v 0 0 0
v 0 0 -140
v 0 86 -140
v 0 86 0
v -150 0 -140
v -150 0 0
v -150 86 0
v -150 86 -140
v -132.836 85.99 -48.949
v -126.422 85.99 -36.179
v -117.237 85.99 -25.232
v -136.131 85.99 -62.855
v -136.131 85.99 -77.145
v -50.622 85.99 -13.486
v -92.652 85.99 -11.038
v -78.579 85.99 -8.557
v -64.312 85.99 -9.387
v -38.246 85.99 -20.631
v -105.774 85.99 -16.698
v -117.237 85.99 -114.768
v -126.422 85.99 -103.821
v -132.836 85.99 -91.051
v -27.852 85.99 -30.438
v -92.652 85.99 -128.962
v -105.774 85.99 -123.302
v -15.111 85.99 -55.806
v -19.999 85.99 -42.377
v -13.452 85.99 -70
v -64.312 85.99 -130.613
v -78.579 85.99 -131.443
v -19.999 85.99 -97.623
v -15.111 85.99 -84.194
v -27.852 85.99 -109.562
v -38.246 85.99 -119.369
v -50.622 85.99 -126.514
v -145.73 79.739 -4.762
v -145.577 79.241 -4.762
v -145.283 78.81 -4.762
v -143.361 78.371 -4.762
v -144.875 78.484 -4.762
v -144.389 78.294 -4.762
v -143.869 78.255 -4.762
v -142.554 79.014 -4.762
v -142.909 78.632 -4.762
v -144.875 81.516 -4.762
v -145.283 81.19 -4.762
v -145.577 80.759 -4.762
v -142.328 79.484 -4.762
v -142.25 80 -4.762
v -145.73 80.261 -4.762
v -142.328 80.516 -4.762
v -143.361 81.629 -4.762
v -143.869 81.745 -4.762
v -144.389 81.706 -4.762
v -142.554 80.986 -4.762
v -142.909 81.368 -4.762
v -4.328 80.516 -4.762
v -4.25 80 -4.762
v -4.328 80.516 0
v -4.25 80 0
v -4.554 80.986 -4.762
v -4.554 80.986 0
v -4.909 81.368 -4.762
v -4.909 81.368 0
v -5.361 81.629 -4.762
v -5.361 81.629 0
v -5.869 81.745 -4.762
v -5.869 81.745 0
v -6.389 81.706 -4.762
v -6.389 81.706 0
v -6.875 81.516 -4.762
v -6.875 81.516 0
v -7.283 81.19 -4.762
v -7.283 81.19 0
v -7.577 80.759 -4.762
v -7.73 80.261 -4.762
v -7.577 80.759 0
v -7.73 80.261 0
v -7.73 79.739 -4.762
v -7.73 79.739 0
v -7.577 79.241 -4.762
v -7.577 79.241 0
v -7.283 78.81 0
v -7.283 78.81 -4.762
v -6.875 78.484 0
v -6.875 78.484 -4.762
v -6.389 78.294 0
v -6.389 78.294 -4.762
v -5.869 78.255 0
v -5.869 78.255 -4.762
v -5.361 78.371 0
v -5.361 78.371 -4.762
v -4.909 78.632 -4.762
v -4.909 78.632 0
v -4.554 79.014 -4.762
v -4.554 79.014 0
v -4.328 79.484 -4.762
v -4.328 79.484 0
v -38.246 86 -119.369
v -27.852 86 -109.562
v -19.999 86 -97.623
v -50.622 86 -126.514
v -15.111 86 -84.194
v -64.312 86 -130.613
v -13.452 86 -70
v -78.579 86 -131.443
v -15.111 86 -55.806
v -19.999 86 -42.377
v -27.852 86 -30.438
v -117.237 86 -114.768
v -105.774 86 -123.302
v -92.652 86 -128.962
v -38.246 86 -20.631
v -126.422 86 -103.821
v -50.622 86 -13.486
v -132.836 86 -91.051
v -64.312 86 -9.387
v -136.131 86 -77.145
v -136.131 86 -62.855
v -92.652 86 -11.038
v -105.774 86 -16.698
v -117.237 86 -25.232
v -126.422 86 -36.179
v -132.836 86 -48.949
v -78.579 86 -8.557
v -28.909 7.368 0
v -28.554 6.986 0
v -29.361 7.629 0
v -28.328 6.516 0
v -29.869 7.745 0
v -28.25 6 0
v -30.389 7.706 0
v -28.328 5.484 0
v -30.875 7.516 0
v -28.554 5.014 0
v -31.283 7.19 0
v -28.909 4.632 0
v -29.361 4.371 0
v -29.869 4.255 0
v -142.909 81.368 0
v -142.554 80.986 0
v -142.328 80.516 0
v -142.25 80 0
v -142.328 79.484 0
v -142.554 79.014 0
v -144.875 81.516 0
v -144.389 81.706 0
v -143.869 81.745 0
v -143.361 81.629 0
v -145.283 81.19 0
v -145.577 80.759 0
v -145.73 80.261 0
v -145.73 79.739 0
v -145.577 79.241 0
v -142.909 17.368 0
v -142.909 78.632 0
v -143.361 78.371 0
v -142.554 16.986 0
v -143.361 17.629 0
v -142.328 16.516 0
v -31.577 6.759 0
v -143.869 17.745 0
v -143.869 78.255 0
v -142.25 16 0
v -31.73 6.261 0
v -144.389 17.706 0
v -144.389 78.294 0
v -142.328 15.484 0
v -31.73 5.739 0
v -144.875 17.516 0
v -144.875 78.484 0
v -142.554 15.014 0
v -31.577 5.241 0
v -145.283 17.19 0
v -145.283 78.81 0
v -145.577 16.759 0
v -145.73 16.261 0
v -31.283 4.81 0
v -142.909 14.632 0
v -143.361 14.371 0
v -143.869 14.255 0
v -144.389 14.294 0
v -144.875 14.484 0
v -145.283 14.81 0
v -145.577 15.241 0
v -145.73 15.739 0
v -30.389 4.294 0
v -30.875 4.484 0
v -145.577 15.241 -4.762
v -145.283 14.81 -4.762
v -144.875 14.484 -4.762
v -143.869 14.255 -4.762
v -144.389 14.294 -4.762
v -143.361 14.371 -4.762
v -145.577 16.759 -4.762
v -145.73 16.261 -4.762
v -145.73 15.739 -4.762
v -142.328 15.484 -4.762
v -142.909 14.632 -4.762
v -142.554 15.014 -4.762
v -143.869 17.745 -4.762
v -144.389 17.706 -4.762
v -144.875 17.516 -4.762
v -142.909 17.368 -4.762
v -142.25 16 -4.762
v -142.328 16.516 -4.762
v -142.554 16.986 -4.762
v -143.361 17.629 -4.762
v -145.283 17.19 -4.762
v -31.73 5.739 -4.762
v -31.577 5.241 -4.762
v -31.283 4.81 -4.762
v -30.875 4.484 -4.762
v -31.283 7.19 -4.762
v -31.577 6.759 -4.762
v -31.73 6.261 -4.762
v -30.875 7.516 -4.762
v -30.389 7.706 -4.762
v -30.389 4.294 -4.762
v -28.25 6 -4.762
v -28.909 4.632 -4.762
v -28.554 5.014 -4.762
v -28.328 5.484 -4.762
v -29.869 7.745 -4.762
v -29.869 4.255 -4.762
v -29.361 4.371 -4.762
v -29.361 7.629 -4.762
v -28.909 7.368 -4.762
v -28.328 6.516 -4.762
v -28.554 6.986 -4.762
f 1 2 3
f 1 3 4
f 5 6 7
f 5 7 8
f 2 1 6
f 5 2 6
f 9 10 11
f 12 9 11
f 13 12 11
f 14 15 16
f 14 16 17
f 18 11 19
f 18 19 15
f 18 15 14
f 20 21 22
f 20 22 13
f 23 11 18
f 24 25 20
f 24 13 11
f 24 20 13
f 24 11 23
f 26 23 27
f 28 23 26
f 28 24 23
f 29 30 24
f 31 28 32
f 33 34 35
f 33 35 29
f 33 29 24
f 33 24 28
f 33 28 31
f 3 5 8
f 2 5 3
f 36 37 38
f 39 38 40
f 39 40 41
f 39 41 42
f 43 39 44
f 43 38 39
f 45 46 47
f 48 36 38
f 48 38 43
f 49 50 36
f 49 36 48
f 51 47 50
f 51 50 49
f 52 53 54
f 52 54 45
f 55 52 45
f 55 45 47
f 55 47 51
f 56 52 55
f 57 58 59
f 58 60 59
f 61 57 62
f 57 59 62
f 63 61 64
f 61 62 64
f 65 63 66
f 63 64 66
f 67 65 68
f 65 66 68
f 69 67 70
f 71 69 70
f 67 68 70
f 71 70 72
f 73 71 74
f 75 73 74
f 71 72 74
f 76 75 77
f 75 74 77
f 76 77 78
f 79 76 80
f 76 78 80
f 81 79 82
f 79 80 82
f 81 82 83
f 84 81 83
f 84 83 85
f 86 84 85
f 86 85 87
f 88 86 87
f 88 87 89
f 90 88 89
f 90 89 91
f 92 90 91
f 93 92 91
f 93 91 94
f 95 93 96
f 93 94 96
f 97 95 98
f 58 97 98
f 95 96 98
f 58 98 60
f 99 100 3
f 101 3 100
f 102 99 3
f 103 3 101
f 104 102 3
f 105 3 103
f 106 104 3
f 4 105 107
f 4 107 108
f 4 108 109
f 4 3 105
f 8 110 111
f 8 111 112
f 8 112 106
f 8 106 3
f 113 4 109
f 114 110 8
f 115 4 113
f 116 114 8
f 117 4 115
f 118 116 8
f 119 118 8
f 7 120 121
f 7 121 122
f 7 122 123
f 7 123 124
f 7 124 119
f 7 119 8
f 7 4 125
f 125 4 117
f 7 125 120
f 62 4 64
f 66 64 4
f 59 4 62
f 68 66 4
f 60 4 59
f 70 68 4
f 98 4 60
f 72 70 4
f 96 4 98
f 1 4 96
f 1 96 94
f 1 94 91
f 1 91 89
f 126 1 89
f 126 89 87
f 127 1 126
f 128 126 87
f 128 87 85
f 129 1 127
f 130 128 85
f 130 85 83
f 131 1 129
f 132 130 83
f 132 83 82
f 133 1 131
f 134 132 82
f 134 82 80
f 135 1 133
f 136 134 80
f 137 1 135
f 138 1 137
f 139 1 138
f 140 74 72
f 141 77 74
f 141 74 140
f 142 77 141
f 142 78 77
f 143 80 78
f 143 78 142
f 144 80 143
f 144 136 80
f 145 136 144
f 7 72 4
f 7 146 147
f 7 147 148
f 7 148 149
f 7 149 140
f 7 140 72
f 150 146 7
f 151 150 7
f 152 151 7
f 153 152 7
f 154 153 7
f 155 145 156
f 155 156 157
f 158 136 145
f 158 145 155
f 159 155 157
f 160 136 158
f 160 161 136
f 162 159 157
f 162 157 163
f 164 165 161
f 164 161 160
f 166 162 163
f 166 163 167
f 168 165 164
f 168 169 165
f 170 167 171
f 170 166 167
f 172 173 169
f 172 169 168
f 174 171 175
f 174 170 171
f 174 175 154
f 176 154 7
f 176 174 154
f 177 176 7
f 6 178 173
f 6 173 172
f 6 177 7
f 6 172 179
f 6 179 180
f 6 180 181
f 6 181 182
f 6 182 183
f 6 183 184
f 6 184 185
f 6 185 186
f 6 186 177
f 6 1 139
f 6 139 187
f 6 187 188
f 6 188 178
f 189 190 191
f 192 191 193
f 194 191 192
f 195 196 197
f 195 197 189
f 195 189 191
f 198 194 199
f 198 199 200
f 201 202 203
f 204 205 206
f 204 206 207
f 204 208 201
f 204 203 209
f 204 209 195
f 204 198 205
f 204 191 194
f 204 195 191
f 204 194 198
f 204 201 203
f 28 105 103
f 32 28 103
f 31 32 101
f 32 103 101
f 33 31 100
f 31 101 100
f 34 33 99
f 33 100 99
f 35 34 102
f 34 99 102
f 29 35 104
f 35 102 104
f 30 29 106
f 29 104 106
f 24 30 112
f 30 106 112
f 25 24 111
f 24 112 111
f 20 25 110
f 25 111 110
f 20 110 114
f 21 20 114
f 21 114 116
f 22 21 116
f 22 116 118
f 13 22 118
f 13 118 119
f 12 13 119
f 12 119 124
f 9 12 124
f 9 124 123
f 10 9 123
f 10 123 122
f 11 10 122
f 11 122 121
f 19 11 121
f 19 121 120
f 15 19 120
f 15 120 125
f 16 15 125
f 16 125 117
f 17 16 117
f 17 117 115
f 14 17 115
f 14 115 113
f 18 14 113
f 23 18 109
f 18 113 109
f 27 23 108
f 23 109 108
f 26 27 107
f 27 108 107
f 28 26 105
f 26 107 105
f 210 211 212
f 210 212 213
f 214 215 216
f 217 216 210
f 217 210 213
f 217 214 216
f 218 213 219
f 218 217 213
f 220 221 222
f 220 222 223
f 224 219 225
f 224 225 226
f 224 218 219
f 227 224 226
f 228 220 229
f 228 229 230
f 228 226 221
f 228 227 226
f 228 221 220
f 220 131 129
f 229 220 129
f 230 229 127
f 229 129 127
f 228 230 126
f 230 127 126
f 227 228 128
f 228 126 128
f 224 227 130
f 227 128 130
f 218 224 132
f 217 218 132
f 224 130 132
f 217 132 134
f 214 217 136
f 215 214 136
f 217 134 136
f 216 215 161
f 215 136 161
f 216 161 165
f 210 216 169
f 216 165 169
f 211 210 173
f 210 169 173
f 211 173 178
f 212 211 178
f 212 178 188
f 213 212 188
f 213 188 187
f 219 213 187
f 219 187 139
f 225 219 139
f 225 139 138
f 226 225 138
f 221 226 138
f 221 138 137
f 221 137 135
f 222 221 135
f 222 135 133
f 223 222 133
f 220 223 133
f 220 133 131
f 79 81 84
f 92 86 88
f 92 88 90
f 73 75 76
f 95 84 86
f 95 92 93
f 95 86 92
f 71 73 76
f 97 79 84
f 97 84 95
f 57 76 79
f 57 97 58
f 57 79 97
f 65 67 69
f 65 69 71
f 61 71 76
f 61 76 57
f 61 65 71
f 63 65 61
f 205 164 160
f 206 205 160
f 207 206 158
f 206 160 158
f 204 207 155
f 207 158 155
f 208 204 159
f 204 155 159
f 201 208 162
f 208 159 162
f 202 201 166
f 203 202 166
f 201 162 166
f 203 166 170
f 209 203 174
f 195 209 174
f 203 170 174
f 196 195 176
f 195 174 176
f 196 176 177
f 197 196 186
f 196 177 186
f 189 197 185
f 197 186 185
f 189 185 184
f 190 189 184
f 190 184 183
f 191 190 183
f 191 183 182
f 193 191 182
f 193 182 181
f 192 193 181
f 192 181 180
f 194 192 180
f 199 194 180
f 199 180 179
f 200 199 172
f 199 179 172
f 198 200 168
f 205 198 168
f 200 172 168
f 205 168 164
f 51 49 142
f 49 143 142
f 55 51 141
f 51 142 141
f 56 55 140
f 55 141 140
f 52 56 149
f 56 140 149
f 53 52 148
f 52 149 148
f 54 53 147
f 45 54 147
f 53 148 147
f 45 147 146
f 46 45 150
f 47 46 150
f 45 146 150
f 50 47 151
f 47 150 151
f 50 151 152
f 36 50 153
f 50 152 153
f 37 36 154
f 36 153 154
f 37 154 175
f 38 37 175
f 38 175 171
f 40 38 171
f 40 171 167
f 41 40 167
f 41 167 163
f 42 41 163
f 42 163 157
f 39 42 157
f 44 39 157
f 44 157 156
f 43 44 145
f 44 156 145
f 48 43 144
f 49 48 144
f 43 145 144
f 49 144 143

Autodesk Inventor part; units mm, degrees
ref_plane "YZ Plane" through (0, 0, 0) normal (1, 0, 0) x (0, 1, 0)
ref_plane "XZ Plane" through (0, 0, 0) normal (0, 1, 0) x (-1, 0, 0)
ref_plane "XY Plane" through (0, 0, 0) normal (0, 0, 1) x (1, 0, 0)
sketch "Sketch1" plane through (0, 0, 0) normal (0, 1, 0) x (-1, 0, 0)
  line L0 (0, 0) -> (150, 0)
  line L1 (150, 0) -> (150, -140)
  line L2 (150, -140) -> (0, -140)
  line L3 (0, -140) -> (0, 0)
  dimension "d0" = 140
  dimension "d2" = 150
extrude "Extrusion1" add sketch "Sketch1" along normal blind 86
sketch "Sketch2" plane through (-150, 0, 0) normal (0, 0, 1) x (1, 0, 0)
  line L0 (150, 0) -> (0, 0) projected
  line L1 (0, 0) -> (6, 0)
  line L2 (6, 0) -> (6, 16)
  line L3 (6, 16) -> (6, 80)
  line L4 (6, 80) -> (144, 80)
  line L5 (0, 0) -> (0, 86) projected
  line L6 (6, 80) -> (144, 80) construction
  circle A0 centre (6, 16) radius 1.75
  line L7 (120, 0) -> (120, 6)
  circle A1 centre (120, 6) radius 1.75
  circle A2 centre (6, 80) radius 1.75
  circle A3 centre (144, 80) radius 1.75
  dimension "d5" = 6
  dimension "d6" = 16
  dimension "d7" = 64
  dimension "d8" = 138
  dimension "d9" = 360
  dimension "d10" = 6
  dimension "d11" = 114
  dimension "d12" = 74
  dimension "d13" = 3.5
  dimension "d14" = 3.5
  dimension "d15" = 3.5
  dimension "d16" = 3.5
extrude "Extrusion2" cut sketch "Sketch2" against normal blind 4.7625
sketch "Sketch3" plane through (0, 86, 0) normal (0, 1, 0) x (1, 0, 0)
  line L0 (-150, 140) -> (-150, 0) projected
  line L1 (-150, 140) -> (-75, 140)
  line L2 (-75, 140) -> (-75, 70)
  line L3 (-75, 70) -> (-150, 70)
  line L4 (-150, 70) -> (-150, 140)
  line L5 (0, 0) -> (0, 140) projected
  line L6 (-150, 140) -> (0, 140)
  line L7 (0, 140) -> (0, 0)
  line L8 (0, 0) -> (-150, 0)
  line L9 (-150, 0) -> (-150, 140)
  circle A0 centre (-75, 70) radius 61.5476
  dimension "d19" = 70
  dimension "d20" = 140
  dimension "d21" = 150
  dimension "d22" = 75
extrude "Extrusion3" cut sketch "Sketch3" against normal blind 0.01 contours A0 L2 L3 | L3 L2 A0
equation "\"d14\" = d13"
equation "\"d15\" = d13"
equation "\"d16\" = d13"
equation "\"d19\" = 0.5 * d20"
equation "\"d22\" = 0.5 * d21"
properties part number "PSU"
